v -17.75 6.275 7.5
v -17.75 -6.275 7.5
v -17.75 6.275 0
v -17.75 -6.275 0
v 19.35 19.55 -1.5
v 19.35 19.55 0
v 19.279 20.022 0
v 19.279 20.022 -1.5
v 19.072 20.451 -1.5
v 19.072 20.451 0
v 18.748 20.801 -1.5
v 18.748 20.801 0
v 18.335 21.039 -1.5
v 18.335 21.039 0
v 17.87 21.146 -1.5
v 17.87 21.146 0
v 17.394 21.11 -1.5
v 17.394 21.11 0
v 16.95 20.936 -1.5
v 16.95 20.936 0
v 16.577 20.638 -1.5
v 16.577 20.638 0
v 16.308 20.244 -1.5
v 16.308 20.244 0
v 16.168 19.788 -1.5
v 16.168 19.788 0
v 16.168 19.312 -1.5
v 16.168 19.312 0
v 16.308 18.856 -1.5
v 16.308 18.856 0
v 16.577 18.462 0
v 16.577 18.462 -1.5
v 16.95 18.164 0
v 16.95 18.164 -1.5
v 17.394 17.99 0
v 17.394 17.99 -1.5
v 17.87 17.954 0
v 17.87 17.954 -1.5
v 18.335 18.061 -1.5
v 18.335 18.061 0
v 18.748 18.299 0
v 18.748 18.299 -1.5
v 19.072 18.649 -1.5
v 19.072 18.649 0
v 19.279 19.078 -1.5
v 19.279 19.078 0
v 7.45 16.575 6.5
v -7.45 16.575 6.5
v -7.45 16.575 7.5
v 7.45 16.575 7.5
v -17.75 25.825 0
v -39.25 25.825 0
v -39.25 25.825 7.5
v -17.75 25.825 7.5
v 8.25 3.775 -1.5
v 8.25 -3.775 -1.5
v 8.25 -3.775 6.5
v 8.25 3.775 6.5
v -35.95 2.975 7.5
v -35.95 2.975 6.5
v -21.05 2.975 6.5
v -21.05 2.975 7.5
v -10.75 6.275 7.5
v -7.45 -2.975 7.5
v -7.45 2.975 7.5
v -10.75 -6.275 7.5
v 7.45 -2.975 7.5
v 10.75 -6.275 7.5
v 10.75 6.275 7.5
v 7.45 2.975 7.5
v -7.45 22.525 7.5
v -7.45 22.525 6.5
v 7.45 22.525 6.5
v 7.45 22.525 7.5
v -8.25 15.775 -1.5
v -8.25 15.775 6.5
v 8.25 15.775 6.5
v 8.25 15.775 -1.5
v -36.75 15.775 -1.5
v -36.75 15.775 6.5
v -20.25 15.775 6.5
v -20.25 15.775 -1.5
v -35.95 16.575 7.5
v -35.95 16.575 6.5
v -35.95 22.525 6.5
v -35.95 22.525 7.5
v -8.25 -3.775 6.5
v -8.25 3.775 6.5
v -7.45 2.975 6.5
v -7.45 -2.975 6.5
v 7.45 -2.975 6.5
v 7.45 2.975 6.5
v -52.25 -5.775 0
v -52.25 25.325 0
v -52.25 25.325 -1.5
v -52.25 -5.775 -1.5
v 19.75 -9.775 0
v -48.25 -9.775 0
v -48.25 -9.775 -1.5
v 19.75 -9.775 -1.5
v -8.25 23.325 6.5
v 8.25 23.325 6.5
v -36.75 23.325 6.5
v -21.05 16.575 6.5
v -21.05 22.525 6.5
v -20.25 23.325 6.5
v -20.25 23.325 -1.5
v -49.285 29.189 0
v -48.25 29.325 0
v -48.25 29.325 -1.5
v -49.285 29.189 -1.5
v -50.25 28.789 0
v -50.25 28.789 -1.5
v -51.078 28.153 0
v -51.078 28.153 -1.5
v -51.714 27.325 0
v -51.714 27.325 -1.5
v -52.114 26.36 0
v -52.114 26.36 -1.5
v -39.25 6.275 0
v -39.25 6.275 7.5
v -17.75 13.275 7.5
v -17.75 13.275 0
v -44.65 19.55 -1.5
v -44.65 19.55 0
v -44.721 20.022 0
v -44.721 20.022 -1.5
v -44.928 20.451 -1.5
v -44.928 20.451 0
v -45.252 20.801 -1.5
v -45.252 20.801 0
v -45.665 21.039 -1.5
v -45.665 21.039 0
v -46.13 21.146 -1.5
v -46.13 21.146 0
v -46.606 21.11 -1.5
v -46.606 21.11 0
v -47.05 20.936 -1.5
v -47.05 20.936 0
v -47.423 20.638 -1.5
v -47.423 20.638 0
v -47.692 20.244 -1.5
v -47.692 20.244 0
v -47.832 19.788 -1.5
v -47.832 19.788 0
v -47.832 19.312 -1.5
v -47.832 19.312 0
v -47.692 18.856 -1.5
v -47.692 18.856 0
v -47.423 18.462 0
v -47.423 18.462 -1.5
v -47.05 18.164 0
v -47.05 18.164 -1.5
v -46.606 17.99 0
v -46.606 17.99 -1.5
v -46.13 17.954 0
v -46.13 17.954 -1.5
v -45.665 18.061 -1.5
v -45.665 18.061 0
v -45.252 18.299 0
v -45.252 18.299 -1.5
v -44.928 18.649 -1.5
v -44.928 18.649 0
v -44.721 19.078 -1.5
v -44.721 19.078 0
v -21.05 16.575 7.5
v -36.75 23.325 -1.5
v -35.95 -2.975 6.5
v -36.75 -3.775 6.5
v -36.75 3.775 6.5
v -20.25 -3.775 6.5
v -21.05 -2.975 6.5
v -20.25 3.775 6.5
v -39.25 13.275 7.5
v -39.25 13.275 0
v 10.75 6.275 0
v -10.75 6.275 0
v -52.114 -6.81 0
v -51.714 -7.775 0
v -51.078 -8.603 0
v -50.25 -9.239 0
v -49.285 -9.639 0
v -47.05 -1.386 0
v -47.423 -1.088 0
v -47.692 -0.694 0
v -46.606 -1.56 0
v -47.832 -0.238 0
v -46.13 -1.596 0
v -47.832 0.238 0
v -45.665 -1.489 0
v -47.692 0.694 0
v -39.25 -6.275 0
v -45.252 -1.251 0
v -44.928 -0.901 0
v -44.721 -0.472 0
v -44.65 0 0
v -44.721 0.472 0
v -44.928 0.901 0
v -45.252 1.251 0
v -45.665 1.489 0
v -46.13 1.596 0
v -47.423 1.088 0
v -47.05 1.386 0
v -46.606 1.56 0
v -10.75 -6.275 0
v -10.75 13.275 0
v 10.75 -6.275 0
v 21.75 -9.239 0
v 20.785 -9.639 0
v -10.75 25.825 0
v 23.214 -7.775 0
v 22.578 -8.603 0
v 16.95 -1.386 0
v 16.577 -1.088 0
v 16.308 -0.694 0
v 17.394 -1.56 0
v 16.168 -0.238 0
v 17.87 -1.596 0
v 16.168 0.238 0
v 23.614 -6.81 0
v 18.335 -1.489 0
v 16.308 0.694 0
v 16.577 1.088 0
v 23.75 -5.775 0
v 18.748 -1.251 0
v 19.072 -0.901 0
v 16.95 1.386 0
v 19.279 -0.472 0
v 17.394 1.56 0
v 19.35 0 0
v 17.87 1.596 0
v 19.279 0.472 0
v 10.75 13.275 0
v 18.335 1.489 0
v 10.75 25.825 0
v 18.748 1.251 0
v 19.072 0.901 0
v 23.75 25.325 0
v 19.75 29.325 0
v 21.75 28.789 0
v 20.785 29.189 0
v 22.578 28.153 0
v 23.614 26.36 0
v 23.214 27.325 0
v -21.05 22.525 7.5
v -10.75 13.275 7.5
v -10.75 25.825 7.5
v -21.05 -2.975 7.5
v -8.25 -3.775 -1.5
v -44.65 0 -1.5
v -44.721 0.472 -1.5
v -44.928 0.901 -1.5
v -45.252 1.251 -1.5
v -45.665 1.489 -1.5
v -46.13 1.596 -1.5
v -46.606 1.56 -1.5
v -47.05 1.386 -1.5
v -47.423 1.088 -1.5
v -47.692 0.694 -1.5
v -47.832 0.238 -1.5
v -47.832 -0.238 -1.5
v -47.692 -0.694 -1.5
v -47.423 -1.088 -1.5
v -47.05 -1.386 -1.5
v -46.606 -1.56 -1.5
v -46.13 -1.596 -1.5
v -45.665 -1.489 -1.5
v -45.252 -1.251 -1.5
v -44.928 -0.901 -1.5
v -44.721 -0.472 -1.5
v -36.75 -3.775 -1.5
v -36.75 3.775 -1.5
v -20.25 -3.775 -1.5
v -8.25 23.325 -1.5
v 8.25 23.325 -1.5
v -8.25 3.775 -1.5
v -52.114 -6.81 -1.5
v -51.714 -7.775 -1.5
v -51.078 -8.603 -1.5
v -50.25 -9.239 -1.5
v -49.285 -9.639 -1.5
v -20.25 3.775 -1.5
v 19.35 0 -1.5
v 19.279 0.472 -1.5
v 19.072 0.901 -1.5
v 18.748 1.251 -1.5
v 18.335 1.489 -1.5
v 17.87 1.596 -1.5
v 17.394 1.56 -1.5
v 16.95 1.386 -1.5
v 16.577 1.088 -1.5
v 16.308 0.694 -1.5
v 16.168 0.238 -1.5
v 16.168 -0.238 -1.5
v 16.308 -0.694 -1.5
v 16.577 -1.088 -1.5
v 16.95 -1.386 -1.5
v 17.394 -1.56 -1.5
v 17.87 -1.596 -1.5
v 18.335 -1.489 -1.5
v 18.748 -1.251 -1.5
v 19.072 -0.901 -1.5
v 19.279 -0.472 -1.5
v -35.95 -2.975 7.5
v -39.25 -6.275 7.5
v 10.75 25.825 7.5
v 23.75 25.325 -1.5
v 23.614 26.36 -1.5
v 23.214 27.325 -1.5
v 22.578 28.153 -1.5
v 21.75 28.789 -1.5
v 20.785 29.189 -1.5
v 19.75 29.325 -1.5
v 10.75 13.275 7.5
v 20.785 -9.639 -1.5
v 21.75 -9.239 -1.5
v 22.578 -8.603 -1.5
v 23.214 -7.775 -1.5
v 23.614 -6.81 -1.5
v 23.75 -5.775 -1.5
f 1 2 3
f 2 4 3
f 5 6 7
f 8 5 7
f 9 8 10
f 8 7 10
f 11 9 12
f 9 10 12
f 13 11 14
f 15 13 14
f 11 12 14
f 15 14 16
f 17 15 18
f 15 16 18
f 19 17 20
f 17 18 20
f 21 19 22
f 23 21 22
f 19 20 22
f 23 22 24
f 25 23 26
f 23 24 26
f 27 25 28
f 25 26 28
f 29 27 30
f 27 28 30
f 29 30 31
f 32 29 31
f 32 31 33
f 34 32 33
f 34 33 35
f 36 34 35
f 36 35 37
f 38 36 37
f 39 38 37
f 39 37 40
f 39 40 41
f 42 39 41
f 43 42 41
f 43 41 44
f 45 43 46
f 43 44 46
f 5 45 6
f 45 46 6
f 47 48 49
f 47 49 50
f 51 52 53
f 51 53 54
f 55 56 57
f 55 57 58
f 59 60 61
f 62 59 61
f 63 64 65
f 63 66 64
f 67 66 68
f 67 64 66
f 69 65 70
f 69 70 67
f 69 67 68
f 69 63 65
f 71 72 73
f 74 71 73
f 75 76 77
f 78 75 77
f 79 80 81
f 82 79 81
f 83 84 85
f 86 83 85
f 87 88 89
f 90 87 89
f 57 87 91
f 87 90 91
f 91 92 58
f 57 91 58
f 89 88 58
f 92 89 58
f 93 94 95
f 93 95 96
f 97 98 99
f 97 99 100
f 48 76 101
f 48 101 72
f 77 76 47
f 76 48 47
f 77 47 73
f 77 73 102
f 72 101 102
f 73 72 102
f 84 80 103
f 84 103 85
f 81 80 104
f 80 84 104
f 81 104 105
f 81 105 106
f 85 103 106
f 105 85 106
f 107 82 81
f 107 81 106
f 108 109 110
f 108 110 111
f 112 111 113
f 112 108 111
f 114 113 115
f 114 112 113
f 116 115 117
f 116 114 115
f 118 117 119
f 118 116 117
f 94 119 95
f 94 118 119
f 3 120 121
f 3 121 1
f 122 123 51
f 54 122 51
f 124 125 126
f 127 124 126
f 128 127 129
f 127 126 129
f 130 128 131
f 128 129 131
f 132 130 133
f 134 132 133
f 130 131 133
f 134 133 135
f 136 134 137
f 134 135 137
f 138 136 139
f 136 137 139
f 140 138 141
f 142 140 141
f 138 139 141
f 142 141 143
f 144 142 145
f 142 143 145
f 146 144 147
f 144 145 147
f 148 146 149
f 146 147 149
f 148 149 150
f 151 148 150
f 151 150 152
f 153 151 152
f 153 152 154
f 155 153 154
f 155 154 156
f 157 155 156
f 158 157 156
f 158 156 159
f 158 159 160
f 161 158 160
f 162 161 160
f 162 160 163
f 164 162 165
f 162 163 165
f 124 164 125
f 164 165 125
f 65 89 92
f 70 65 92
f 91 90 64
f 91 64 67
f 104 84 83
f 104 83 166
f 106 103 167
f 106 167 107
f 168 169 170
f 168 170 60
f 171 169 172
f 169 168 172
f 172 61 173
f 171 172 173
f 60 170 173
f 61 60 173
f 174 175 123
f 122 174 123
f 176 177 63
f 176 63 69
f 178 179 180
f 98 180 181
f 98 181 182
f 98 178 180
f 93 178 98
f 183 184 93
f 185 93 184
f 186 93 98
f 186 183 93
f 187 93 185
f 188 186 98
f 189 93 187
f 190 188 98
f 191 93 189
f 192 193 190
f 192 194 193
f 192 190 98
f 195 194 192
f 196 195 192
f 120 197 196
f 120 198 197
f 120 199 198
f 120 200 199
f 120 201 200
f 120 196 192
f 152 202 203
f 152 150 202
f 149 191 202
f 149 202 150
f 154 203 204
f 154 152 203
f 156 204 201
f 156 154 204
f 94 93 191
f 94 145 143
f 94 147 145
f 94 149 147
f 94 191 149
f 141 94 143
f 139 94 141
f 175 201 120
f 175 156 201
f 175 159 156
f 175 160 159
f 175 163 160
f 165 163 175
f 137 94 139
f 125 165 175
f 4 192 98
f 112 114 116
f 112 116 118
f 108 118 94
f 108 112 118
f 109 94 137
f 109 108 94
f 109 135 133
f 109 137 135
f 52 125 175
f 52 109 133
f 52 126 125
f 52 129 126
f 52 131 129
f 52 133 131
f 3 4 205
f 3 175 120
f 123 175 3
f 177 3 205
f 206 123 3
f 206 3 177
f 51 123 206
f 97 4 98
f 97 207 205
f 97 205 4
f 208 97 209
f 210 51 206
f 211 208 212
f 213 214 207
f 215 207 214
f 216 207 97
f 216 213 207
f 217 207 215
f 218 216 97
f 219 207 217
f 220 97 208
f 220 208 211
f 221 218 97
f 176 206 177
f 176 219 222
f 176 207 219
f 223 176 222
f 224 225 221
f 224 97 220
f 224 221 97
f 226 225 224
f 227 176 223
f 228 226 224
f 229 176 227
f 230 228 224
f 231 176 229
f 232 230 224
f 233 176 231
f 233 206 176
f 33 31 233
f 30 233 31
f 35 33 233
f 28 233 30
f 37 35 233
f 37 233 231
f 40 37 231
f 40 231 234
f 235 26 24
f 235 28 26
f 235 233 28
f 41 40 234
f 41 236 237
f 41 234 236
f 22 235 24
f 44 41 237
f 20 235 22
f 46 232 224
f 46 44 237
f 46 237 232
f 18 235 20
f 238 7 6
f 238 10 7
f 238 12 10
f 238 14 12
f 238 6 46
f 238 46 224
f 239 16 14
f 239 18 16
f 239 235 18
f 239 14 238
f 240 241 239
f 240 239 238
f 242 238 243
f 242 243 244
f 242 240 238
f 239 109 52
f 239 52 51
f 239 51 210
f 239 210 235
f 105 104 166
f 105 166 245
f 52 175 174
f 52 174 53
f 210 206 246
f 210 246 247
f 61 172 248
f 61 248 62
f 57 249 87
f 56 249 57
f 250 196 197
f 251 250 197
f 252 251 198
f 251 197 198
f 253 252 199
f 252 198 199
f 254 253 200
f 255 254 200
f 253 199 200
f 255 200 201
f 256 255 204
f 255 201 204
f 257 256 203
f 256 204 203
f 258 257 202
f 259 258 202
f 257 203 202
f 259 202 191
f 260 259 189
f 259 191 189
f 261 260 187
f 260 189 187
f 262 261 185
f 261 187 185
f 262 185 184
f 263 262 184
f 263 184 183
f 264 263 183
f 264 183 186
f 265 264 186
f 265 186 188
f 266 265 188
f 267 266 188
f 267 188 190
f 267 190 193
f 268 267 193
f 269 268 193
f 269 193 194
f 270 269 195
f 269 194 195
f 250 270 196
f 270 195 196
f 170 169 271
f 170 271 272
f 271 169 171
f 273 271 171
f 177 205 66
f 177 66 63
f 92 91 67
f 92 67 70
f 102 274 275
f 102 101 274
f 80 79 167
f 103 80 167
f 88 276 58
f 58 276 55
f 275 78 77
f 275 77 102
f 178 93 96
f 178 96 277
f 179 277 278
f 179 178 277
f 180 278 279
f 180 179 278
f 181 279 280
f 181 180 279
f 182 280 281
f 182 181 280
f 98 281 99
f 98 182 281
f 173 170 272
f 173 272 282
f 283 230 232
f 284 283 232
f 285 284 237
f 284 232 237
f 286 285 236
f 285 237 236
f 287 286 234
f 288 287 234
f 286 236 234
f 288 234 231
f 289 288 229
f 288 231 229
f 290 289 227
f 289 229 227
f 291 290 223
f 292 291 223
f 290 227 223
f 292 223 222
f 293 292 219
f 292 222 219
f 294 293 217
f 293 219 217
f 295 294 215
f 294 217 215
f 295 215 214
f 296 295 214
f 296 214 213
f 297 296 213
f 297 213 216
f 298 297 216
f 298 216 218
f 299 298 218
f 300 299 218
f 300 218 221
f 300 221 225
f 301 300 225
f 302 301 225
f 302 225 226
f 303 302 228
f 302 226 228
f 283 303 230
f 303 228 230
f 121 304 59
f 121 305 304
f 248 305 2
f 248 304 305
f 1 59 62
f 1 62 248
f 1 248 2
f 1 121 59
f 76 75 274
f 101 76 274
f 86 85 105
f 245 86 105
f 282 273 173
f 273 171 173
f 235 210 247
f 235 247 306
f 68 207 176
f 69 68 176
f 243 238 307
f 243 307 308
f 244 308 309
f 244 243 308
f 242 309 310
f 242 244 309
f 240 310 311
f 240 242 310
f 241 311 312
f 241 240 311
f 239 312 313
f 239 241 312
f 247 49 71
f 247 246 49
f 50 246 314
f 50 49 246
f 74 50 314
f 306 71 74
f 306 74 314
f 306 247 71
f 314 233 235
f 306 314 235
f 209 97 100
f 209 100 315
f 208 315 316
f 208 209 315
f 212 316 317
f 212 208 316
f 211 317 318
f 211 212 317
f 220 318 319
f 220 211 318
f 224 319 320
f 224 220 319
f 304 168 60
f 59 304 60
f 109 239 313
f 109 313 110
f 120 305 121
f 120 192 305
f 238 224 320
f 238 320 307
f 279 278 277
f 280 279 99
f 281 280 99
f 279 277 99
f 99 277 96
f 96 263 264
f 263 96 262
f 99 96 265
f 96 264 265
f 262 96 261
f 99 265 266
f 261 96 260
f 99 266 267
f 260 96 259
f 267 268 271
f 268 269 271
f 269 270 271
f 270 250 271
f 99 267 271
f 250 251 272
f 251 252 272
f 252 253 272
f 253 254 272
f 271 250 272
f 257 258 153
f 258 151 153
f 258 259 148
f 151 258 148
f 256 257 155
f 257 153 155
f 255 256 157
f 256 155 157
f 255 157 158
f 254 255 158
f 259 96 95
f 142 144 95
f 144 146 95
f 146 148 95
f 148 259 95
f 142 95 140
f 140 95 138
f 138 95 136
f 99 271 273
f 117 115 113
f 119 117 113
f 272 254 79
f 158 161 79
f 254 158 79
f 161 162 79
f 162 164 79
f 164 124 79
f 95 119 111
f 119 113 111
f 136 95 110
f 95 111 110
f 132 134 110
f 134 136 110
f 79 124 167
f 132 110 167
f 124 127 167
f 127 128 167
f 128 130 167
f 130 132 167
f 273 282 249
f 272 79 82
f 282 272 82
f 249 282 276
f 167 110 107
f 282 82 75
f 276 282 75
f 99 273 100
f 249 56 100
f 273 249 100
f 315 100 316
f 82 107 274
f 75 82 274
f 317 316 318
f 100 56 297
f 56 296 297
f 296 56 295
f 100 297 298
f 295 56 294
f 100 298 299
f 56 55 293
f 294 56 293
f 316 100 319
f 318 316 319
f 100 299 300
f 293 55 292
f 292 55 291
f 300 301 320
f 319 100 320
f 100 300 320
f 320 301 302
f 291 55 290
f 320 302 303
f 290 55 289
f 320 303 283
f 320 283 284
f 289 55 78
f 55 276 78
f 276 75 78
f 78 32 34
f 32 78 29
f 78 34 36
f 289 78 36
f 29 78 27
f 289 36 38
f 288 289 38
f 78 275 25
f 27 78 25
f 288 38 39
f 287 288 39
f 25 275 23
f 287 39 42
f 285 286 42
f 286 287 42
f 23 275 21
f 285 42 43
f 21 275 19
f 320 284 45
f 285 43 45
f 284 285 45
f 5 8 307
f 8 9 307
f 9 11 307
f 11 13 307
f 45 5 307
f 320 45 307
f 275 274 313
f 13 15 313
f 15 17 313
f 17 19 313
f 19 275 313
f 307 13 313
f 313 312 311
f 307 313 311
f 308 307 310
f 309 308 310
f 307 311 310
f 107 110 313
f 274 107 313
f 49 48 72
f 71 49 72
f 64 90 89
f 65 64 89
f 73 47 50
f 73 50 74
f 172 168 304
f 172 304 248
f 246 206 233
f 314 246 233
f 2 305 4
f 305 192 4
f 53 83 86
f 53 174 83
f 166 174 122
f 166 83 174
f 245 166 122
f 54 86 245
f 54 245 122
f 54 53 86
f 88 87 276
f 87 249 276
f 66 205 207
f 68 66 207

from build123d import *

# Parameters (mm, degrees)
F0_R     = 1.6
F0_W     = 21.5
F0_H     = 12.55
F0_W_2   = 16.5
F0_H_2   = 7.55
F1_DEPTH = 1.5
F2_DEPTH = 6.5
F3_W     = 21.5
F3_H     = 12.55
F3_W_2   = 16.5
F3_H_2   = 7.55
F3_W_3   = 14.9
F3_H_3   = 5.95
F4_DEPTH = 1


with BuildPart() as f1:
    # F0 (on Top) → F1 (new body)
    with BuildSketch(Plane.XY):
        with BuildLine():
            Line((-14.25, -9.775), (17.75, -9.775))
            Line((17.75, -9.775), (19.75, -9.775))
            ThreePointArc((19.75, -9.775), (22.5784271247, -8.6034271247), (23.75, -5.775))
            Line((23.75, -5.775), (23.75, 25.325))
            ThreePointArc((23.75, 25.325), (22.5784271247, 28.1534271247), (19.75, 29.325))
            Line((19.75, 29.325), (17.75, 29.325))
            Line((17.75, 29.325), (-14.25, 29.325))
            Line((-14.25, 29.325), (-46.25, 29.325))
            Line((-46.25, 29.325), (-48.25, 29.325))
            ThreePointArc((-48.25, 29.325), (-51.0784271247, 28.1534271247), (-52.25, 25.325))
            Line((-52.25, 25.325), (-52.25, -5.775))
            ThreePointArc((-52.25, -5.775), (-51.0784271247, -8.6034271247), (-48.25, -9.775))
            Line((-48.25, -9.775), (-46.25, -9.775))
            Line((-46.25, -9.775), (-14.25, -9.775))
        make_face()
        with Locations((-46.25, 0)):
            Circle(F0_R, mode=Mode.SUBTRACT)
        with Locations((-28.5, 0)):
            Rectangle(F0_W, F0_H, mode=Mode.SUBTRACT)
        Rectangle(F0_W, F0_H, mode=Mode.SUBTRACT)
        with Locations((17.75, 0)):
            Circle(F0_R, mode=Mode.SUBTRACT)
        with Locations((-46.25, 19.55)):
            Circle(F0_R, mode=Mode.SUBTRACT)
        with Locations((-28.5, 19.55)):
            Rectangle(F0_W, F0_H, mode=Mode.SUBTRACT)
        with Locations((0, 19.55)):
            Rectangle(F0_W, F0_H, mode=Mode.SUBTRACT)
        with Locations((17.75, 19.55)):
            Circle(F0_R, mode=Mode.SUBTRACT)
        with Locations((-28.5, 0)):
            Rectangle(F0_W, F0_H)
        with Locations((-28.5, 0)):
            Rectangle(F0_W_2, F0_H_2, mode=Mode.SUBTRACT)
        Rectangle(F0_W, F0_H)
        Rectangle(F0_W_2, F0_H_2, mode=Mode.SUBTRACT)
        with Locations((-28.5, 19.55)):
            Rectangle(F0_W, F0_H)
        with Locations((-28.5, 19.55)):
            Rectangle(F0_W_2, F0_H_2, mode=Mode.SUBTRACT)
        with Locations((0, 19.55)):
            Rectangle(F0_W, F0_H)
        with Locations((0, 19.55)):
            Rectangle(F0_W_2, F0_H_2, mode=Mode.SUBTRACT)
    extrude(amount=-F1_DEPTH)

    # F0 (on Top) → F2 (join)
    with BuildSketch(Plane.XY):
        Rectangle(F0_W, F0_H)
        Rectangle(F0_W_2, F0_H_2, mode=Mode.SUBTRACT)
        with Locations((-28.5, 0)):
            Rectangle(F0_W, F0_H)
        with Locations((-28.5, 0)):
            Rectangle(F0_W_2, F0_H_2, mode=Mode.SUBTRACT)
        with Locations((-28.5, 19.55)):
            Rectangle(F0_W, F0_H)
        with Locations((-28.5, 19.55)):
            Rectangle(F0_W_2, F0_H_2, mode=Mode.SUBTRACT)
        with Locations((0, 19.55)):
            Rectangle(F0_W, F0_H)
        with Locations((0, 19.55)):
            Rectangle(F0_W_2, F0_H_2, mode=Mode.SUBTRACT)
    extrude(amount=F2_DEPTH)

    # F3 (on face) → F4 (join)
    with BuildSketch(Plane.XY.offset(6.5)):
        with Locations((-28.5, 0)):
            Rectangle(F3_W, F3_H)
        with Locations((-28.5, 0)):
            Rectangle(F3_W_2, F3_H_2, mode=Mode.SUBTRACT)
        Rectangle(F3_W, F3_H)
        Rectangle(F3_W_2, F3_H_2, mode=Mode.SUBTRACT)
        with Locations((-28.5, 19.55)):
            Rectangle(F3_W, F3_H)
        with Locations((-28.5, 19.55)):
            Rectangle(F3_W_2, F3_H_2, mode=Mode.SUBTRACT)
        with Locations((0, 19.55)):
            Rectangle(F3_W, F3_H)
        with Locations((0, 19.55)):
            Rectangle(F3_W_2, F3_H_2, mode=Mode.SUBTRACT)
        with Locations((-28.5, 0)):
            Rectangle(F3_W_2, F3_H_2)
        with Locations((-28.5, 0)):
            Rectangle(F3_W_3, F3_H_3, mode=Mode.SUBTRACT)
        Rectangle(F3_W_2, F3_H_2)
        Rectangle(F3_W_3, F3_H_3, mode=Mode.SUBTRACT)
        with Locations((-28.5, 19.55)):
            Rectangle(F3_W_2, F3_H_2)
        with Locations((-28.5, 19.55)):
            Rectangle(F3_W_3, F3_H_3, mode=Mode.SUBTRACT)
        with Locations((0, 19.55)):
            Rectangle(F3_W_2, F3_H_2)
        with Locations((0, 19.55)):
            Rectangle(F3_W_3, F3_H_3, mode=Mode.SUBTRACT)
    extrude(amount=F4_DEPTH)


solid = f1.part
